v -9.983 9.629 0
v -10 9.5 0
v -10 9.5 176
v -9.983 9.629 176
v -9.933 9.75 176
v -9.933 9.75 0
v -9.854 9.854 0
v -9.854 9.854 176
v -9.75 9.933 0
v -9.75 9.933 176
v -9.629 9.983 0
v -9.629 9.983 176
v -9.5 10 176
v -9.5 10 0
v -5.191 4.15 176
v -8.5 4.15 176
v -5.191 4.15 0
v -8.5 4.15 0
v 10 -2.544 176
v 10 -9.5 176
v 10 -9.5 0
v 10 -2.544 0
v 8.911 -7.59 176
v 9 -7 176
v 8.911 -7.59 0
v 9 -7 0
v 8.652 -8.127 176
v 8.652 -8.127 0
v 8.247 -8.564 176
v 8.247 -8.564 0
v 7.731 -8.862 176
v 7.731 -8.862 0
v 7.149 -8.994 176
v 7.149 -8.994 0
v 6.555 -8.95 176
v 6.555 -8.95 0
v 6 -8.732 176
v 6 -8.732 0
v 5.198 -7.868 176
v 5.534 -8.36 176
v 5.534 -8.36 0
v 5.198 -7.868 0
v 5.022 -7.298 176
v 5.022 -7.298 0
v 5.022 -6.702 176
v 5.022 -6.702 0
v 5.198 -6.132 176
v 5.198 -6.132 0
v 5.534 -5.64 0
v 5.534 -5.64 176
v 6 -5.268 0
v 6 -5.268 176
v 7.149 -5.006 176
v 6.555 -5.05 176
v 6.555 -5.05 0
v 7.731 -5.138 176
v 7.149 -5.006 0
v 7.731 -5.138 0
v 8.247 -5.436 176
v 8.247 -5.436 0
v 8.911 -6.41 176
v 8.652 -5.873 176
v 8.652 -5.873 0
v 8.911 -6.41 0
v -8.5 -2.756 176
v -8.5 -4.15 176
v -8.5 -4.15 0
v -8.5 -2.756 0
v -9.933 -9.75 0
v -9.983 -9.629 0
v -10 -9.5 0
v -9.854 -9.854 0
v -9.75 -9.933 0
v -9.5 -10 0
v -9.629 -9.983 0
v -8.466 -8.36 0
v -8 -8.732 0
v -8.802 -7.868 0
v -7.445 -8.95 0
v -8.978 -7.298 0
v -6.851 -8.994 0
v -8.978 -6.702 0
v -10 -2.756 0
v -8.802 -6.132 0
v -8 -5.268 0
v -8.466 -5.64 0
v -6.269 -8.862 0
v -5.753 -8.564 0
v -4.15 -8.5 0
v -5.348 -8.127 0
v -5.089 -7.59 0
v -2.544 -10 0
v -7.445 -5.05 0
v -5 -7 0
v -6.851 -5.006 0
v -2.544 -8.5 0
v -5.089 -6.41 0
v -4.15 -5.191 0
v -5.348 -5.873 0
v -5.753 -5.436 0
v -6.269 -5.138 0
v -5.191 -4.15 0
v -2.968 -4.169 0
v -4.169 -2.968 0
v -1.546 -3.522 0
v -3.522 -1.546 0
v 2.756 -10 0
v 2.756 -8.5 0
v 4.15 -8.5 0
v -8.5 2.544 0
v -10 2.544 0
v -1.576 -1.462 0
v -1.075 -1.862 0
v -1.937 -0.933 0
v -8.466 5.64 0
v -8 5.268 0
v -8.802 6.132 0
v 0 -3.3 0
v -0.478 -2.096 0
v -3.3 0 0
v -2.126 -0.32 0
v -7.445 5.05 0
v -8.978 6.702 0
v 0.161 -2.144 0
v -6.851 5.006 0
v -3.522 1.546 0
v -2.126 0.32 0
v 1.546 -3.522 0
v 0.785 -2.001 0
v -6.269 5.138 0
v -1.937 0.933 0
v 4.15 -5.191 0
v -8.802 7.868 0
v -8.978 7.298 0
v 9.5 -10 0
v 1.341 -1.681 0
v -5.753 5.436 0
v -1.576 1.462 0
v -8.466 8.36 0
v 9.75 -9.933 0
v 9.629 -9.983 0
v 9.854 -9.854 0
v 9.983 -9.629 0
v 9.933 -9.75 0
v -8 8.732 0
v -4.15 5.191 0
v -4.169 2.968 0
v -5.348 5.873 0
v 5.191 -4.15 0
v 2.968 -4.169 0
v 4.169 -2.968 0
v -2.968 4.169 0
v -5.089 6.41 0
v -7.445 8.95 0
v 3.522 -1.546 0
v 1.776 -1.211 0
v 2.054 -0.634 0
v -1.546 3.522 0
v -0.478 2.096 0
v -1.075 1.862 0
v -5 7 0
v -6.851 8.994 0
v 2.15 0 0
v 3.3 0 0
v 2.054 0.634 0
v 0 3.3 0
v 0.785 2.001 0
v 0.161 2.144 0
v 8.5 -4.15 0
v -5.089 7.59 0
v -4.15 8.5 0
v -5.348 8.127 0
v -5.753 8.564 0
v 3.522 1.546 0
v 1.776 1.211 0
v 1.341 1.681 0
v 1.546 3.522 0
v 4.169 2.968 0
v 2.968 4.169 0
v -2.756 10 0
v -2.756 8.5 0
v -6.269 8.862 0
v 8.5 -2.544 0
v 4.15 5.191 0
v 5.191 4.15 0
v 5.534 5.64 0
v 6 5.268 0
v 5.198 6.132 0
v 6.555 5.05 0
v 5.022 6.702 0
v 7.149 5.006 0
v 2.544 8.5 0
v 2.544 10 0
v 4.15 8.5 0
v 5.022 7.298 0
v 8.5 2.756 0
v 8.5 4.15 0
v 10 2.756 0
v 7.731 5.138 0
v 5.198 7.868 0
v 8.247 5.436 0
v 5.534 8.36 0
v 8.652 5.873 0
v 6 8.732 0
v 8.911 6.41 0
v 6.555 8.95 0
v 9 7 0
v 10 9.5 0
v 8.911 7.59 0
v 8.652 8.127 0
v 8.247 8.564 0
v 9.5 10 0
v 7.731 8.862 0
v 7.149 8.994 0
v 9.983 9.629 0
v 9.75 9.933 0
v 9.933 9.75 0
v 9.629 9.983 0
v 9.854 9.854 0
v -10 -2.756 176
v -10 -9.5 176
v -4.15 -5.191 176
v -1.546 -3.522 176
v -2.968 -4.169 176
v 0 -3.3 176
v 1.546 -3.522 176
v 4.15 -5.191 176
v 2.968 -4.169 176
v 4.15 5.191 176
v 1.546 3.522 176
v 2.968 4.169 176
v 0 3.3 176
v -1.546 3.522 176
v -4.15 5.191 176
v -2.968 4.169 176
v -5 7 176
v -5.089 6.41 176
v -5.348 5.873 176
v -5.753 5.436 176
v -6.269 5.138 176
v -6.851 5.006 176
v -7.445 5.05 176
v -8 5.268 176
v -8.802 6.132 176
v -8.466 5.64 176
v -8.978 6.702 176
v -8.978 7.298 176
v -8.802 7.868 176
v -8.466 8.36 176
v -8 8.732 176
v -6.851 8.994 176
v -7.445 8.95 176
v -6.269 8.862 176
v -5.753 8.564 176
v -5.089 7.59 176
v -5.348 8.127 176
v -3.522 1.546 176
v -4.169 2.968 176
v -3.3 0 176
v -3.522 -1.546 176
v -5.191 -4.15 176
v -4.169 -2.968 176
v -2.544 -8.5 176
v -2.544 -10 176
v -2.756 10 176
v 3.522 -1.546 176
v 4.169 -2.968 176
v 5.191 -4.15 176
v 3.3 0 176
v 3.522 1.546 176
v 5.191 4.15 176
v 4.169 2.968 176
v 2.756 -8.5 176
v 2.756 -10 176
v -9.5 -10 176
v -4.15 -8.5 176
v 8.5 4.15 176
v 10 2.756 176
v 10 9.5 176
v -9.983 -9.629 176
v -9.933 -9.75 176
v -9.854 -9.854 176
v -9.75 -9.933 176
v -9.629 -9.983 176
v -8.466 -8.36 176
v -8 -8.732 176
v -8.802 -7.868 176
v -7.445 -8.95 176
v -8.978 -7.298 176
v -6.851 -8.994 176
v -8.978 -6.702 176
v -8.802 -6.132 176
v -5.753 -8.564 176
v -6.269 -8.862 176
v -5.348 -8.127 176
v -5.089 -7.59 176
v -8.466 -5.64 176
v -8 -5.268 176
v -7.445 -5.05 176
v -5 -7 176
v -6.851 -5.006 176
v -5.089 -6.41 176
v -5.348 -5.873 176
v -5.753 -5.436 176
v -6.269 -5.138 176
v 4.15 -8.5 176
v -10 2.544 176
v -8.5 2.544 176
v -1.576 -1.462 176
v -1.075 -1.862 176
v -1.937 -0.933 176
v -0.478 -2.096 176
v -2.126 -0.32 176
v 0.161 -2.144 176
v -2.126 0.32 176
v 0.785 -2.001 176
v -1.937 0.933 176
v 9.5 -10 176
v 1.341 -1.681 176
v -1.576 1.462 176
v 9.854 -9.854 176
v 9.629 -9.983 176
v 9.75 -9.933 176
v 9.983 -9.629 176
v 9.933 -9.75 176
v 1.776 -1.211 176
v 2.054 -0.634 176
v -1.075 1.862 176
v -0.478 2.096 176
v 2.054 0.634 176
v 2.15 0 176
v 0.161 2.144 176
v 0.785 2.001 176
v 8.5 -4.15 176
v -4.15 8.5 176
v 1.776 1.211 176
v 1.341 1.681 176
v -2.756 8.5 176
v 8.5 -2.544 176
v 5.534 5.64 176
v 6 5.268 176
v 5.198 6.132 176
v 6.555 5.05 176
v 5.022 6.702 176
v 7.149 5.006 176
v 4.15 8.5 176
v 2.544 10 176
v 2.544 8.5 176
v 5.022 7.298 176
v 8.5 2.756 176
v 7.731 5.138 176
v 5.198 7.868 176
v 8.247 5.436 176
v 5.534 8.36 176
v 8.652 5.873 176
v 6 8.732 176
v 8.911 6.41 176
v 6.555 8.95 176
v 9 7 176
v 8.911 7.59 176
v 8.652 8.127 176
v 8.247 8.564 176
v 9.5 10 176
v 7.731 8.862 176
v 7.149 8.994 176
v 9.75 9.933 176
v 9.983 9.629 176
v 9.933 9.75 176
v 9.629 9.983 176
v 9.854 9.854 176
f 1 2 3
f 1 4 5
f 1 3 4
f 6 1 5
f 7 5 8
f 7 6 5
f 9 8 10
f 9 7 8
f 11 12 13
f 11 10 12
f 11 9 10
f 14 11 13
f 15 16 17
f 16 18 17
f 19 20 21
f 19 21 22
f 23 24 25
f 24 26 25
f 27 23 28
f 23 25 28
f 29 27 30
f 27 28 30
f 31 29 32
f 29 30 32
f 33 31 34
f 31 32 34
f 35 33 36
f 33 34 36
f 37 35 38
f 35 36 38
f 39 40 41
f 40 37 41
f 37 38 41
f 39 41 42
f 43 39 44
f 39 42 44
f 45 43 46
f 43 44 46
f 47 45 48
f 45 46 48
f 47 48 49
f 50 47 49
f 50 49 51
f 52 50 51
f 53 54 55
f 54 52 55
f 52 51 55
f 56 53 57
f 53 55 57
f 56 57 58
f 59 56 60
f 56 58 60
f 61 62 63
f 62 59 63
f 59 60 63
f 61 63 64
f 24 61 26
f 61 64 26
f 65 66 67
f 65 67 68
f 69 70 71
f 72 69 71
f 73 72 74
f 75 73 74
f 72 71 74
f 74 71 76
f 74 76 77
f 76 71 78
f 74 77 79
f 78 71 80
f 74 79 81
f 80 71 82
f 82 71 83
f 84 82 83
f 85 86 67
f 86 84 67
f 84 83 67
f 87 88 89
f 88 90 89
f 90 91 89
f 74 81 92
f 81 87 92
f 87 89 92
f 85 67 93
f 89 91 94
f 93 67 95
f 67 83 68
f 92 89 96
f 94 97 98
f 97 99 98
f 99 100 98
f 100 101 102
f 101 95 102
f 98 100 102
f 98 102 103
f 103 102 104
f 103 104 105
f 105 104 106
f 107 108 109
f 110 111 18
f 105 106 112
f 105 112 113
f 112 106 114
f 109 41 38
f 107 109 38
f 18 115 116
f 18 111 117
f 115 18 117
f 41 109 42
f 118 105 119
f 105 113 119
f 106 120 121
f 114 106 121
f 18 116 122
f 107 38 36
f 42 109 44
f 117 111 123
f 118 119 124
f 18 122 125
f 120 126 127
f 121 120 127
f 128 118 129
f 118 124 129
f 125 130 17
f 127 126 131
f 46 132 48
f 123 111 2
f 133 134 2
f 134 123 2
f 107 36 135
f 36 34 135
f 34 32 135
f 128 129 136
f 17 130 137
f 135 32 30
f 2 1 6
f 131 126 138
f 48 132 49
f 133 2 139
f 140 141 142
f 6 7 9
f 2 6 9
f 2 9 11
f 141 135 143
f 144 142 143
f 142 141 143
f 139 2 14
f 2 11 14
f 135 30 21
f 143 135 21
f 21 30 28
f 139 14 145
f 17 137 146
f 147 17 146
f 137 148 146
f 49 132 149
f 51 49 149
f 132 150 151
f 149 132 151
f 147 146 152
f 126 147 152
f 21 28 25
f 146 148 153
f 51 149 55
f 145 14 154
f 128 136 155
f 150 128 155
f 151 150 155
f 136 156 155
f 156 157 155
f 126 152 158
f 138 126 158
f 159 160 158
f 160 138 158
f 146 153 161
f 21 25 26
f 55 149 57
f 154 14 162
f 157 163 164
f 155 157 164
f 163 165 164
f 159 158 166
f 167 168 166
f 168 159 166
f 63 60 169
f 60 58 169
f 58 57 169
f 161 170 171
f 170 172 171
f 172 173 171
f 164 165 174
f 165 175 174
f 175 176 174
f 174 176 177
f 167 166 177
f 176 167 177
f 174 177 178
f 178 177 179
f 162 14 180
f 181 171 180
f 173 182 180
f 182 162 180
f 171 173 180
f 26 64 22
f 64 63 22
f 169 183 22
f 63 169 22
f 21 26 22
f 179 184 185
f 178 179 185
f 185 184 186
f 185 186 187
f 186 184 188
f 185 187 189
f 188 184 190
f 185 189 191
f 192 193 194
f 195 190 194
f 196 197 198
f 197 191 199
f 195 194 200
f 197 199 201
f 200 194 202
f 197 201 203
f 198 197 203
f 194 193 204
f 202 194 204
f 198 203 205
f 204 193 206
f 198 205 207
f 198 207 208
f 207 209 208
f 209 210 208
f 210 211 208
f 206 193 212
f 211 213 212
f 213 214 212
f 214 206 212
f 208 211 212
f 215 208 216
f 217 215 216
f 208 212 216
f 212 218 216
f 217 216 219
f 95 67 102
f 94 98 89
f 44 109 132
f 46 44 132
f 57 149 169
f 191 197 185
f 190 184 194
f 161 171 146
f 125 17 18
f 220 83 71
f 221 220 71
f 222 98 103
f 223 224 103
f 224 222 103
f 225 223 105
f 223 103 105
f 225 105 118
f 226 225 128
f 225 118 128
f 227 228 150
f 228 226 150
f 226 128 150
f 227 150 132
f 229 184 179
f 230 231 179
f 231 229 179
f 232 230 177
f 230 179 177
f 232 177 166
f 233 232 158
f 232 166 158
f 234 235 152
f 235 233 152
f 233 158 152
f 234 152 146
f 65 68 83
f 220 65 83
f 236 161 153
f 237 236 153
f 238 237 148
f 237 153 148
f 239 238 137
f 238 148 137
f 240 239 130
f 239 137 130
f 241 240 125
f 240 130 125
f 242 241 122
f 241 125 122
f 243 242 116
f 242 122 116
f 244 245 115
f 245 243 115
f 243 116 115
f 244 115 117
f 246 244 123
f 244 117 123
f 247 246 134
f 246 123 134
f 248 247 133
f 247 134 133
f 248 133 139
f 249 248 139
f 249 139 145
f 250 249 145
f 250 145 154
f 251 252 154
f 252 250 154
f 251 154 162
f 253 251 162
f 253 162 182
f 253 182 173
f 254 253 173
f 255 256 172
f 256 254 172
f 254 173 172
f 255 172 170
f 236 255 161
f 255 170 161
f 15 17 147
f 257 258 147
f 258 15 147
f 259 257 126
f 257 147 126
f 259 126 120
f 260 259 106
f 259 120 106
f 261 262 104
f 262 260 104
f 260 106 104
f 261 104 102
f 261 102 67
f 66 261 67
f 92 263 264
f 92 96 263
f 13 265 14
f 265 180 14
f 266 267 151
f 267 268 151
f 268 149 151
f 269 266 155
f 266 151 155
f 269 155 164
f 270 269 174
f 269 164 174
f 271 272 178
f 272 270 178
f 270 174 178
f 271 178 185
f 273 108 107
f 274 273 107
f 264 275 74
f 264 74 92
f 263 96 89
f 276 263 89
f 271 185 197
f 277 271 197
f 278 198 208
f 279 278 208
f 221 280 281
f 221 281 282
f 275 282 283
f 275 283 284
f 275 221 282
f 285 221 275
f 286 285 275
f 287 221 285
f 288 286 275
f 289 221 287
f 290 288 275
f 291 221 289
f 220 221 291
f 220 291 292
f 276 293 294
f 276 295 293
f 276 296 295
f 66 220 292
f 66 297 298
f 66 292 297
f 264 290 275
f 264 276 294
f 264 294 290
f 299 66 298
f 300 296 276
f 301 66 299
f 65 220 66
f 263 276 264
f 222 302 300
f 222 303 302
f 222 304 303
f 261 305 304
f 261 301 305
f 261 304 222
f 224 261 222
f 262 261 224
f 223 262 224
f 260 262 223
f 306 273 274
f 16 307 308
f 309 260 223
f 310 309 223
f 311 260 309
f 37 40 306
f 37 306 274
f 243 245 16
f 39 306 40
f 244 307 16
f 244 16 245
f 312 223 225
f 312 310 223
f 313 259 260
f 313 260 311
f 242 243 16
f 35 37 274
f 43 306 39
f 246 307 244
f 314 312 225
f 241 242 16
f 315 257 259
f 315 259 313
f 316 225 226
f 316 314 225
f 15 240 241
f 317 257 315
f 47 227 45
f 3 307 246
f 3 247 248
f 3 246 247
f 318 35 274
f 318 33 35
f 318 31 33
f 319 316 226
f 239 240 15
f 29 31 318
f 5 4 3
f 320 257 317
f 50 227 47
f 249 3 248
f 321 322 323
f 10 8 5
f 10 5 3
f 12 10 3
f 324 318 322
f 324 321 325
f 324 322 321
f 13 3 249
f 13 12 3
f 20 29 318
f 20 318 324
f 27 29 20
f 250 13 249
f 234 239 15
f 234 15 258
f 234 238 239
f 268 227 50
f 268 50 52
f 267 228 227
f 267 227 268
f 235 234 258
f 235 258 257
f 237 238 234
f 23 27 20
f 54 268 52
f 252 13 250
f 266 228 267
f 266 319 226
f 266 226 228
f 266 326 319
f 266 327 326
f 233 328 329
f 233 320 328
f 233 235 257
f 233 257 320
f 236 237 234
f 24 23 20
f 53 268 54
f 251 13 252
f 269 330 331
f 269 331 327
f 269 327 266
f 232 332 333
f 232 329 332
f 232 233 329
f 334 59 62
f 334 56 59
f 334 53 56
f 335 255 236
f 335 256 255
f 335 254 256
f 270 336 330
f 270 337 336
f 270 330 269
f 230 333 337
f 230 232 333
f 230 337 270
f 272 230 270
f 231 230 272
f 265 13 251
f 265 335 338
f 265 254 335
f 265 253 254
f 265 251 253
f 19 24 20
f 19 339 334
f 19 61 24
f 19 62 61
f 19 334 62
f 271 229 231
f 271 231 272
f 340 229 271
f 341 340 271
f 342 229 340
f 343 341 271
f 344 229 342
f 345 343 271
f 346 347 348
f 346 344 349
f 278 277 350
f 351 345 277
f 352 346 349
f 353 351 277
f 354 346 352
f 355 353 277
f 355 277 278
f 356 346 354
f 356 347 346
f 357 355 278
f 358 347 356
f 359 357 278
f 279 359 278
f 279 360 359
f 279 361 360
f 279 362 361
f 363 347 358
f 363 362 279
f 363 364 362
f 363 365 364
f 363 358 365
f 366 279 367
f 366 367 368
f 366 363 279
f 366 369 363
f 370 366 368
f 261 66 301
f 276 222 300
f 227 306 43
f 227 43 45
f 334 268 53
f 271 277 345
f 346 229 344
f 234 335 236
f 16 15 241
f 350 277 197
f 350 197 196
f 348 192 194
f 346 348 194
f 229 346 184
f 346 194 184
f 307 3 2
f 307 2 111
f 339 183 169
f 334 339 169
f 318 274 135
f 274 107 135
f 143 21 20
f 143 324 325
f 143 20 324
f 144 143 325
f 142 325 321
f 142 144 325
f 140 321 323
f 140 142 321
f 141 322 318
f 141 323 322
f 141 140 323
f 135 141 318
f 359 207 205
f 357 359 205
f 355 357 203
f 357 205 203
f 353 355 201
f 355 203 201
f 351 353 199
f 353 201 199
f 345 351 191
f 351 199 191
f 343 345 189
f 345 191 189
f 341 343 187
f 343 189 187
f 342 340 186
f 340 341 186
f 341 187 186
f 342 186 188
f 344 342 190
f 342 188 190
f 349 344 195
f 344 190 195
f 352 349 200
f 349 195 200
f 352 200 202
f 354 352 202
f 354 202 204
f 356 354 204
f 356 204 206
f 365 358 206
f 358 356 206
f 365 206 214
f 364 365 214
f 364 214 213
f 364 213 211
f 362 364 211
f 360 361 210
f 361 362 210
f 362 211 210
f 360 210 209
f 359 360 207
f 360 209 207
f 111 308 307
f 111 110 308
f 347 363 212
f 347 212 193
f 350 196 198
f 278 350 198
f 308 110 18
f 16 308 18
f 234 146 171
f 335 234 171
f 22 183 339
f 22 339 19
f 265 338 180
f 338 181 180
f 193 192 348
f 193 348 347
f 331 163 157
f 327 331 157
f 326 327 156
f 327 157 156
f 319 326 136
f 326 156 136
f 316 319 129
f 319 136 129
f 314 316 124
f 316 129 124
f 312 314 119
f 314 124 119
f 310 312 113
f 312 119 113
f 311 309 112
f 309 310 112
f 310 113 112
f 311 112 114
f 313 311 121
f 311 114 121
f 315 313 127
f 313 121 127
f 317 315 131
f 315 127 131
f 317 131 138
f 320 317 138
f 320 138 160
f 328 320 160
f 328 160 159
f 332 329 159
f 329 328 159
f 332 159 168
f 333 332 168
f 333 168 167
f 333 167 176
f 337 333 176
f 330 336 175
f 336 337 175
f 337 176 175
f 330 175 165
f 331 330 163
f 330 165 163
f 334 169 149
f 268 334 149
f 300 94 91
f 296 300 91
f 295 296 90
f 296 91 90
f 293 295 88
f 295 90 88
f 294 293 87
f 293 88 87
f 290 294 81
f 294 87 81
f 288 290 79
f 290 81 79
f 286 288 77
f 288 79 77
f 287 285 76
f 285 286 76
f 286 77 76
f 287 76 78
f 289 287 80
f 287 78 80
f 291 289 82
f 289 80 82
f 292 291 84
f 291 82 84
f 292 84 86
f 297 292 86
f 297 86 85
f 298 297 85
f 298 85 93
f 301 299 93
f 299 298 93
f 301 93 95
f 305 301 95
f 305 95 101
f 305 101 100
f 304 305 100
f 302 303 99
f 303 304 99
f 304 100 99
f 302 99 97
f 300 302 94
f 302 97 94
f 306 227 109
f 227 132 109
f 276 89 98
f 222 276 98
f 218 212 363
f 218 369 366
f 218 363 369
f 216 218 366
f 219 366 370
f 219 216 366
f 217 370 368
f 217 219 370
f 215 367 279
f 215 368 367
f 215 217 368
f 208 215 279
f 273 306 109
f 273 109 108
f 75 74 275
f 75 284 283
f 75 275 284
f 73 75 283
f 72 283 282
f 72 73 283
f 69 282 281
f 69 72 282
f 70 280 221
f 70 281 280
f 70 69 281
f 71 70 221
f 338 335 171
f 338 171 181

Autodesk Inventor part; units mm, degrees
ref_plane "YZ Plane" through (0, 0, 0) normal (1, 0, 0) x (0, 1, 0)
ref_plane "XZ Plane" through (0, 0, 0) normal (0, 1, 0) x (-1, 0, 0)
ref_plane "XY Plane" through (0, 0, 0) normal (0, 0, 1) x (1, 0, 0)
sketch "Sketch1" plane through (0, 0, 0) normal (0, 0, 1) x (1, 0, 0)
  line L0 (-10, -10) -> (10, 10) construction
  line L1 (10, -10) -> (-10, 10) construction
  arc A0 (-10, -9.5) -> (-9.5, -10) centre (-9.5, -9.5) ccw
  arc A1 (-9.5, 10) -> (-10, 9.5) centre (-9.5, 9.5) ccw
  arc A2 (10, 9.5) -> (9.5, 10) centre (9.5, 9.5) ccw
  arc A3 (9.5, -10) -> (10, -9.5) centre (9.5, -9.5) ccw
  line L2 (7, -7) -> (-7, -7) construction
  line L3 (-7, -7) -> (-7, 7) construction
  line L4 (-7, 7) -> (7, 7) construction
  line L5 (7, 7) -> (7, -7) construction
  line L6 (7, -7) -> (-7, 7) construction
  line L7 (-7, -7) -> (7, 7) construction
  circle A4 centre (-7, -7) radius 2
  circle A5 centre (-7, 7) radius 2
  circle A6 centre (7, 7) radius 2
  circle A7 centre (7, -7) radius 2
  circle A8 centre (0, 0) radius 2.15
  line L8 (-8.5, 4.15) -> (-5.1906, 4.15)
  arc A9 (-5.1906, -4.15) -> (-5.1906, 4.15) centre (-8.8, 0) ccw
  line L9 (-5.1906, -4.15) -> (-8.5, -4.15)
  line L10 (-8.5, -4.15) -> (-8.5, -2.7559)
  line L11 (-8.5, 2.5441) -> (-8.5, 4.15)
  line L12 (-5.1906, -4.15) -> (-5.1906, 4.15) construction
  line L13 (-8.5, -2.7559) -> (-10, -2.7559)
  line L14 (-8.5, 2.5441) -> (-10, 2.5441)
  line L15 (-10, 9.5) -> (-10, 2.5441)
  line L16 (-10, -2.7559) -> (-10, -9.5)
  line L17 (4.15, -8.5) -> (2.7559, -8.5)
  line L18 (2.7559, -8.5) -> (2.7559, -10)
  line L19 (4.15, -5.1906) -> (-4.15, -5.1906) construction
  arc A10 (4.15, -5.1906) -> (-4.15, -5.1906) centre (0, -8.8) ccw
  line L20 (7, -7) -> (-7, 7) construction
  line L21 (10, -10) -> (-10, 10) construction
  line L22 (-4.15, -8.5) -> (-4.15, -5.1906)
  line L23 (4.15, -5.1906) -> (4.15, -8.5)
  line L24 (-2.5441, -8.5) -> (-2.5441, -10)
  line L25 (-2.5441, -8.5) -> (-4.15, -8.5)
  line L26 (8.5, 4.15) -> (8.5, 2.7559)
  line L27 (8.5, 2.7559) -> (10, 2.7559)
  line L28 (5.1906, 4.15) -> (5.1906, -4.15) construction
  arc A11 (5.1906, 4.15) -> (5.1906, -4.15) centre (8.8, 0) ccw
  line L29 (7, 7) -> (-7, -7) construction
  line L30 (10, 10) -> (-10, -10) construction
  line L31 (8.5, -4.15) -> (5.1906, -4.15)
  line L32 (5.1906, 4.15) -> (8.5, 4.15)
  line L33 (8.5, -2.5441) -> (10, -2.5441)
  line L34 (8.5, -2.5441) -> (8.5, -4.15)
  line L35 (-4.15, 8.5) -> (-2.7559, 8.5)
  line L36 (-2.7559, 8.5) -> (-2.7559, 10)
  line L37 (-4.15, 5.1906) -> (4.15, 5.1906) construction
  arc A12 (-4.15, 5.1906) -> (4.15, 5.1906) centre (0, 8.8) ccw
  line L38 (-7, 7) -> (7, -7) construction
  line L39 (-10, 10) -> (10, -10) construction
  line L40 (4.15, 8.5) -> (4.15, 5.1906)
  line L41 (-4.15, 5.1906) -> (-4.15, 8.5)
  line L42 (2.5441, 8.5) -> (2.5441, 10)
  line L43 (2.5441, 8.5) -> (4.15, 8.5)
  line L44 (-9.5, -10) -> (-2.5441, -10)
  line L45 (2.7559, -10) -> (9.5, -10)
  line L46 (9.5, 10) -> (2.5441, 10)
  line L47 (-2.7559, 10) -> (-9.5, 10)
  line L48 (10, -9.5) -> (10, -2.5441)
  line L49 (10, 2.7559) -> (10, 9.5)
  line L50 (2292.4151, 1187.1915) -> (2314.8128, 1187.1915)
  circle A13 centre (2303.6139, 1187.1915) radius 2.15
  line L51 (2307.7639, 1192.1343) -> (2307.7639, 1195.3915)
  arc A14 (2307.7639, 1195.3915) -> (2307.4639, 1195.6915) centre (2307.4639, 1195.3915) ccw
  line L52 (2307.4639, 1195.6915) -> (2306.5639, 1195.6915)
  arc A15 (2306.2639, 1195.9915) -> (2306.5639, 1195.6915) centre (2306.5639, 1195.9915) ccw
  line L53 (2306.2639, 1195.9915) -> (2306.2639, 1196.8915)
  arc A16 (2306.5639, 1197.1915) -> (2306.2639, 1196.8915) centre (2306.5639, 1196.8915) ccw
  line L54 (2306.5639, 1197.1915) -> (2313.3139, 1197.1915)
  arc A17 (2313.6139, 1196.8915) -> (2313.3139, 1197.1915) centre (2313.3139, 1196.8915) ccw
  line L55 (2313.6139, 1196.8915) -> (2313.6139, 1190.1415)
  arc A18 (2313.3139, 1189.8415) -> (2313.6139, 1190.1415) centre (2313.3139, 1190.1415) ccw
  line L56 (2313.3139, 1189.8415) -> (2312.4139, 1189.8415)
  arc A19 (2312.1139, 1190.1415) -> (2312.4139, 1189.8415) centre (2312.4139, 1190.1415) ccw
  line L57 (2312.1139, 1190.1415) -> (2312.1139, 1191.0415)
  arc A20 (2312.1139, 1191.0415) -> (2311.8139, 1191.3415) centre (2311.8139, 1191.0415) ccw
  line L58 (2311.8139, 1191.3415) -> (2308.5567, 1191.3415)
  arc A21 (2308.5567, 1191.3415) -> (2308.3217, 1191.2281) centre (2308.5567, 1191.0415) ccw
  arc A22 (2308.3217, 1191.2281) -> (2306.9212, 1187.4988) centre (2313.4048, 1187.1915) ccw
  line L59 (2306.9212, 1187.4988) -> (2306.6139, 1187.1915)
  line L60 (2306.6139, 1187.1915) -> (2306.9212, 1186.8843)
  arc A23 (2306.9212, 1186.8843) -> (2308.3217, 1183.155) centre (2313.4048, 1187.1915) ccw
  arc A24 (2308.3217, 1183.155) -> (2308.5567, 1183.0415) centre (2308.5567, 1183.3415) ccw
  line L61 (2308.5567, 1183.0415) -> (2311.8139, 1183.0415)
  arc A25 (2311.8139, 1183.0415) -> (2312.1139, 1183.3415) centre (2311.8139, 1183.3415) ccw
  line L62 (2312.1139, 1183.3415) -> (2312.1139, 1184.2415)
  arc A26 (2312.4139, 1184.5415) -> (2312.1139, 1184.2415) centre (2312.4139, 1184.2415) ccw
  line L63 (2312.4139, 1184.5415) -> (2313.3139, 1184.5415)
  arc A27 (2313.6139, 1184.2415) -> (2313.3139, 1184.5415) centre (2313.3139, 1184.2415) ccw
  line L64 (2313.6139, 1184.2415) -> (2313.6139, 1177.4915)
  arc A28 (2313.3139, 1177.1915) -> (2313.6139, 1177.4915) centre (2313.3139, 1177.4915) ccw
  line L65 (2313.3139, 1177.1915) -> (2306.5639, 1177.1915)
  arc A29 (2306.2639, 1177.4915) -> (2306.5639, 1177.1915) centre (2306.5639, 1177.4915) ccw
  line L66 (2306.2639, 1177.4915) -> (2306.2639, 1178.3915)
  arc A30 (2306.5639, 1178.6915) -> (2306.2639, 1178.3915) centre (2306.5639, 1178.3915) ccw
  line L67 (2306.5639, 1178.6915) -> (2307.4639, 1178.6915)
  arc A31 (2307.4639, 1178.6915) -> (2307.7639, 1178.9915) centre (2307.4639, 1178.9915) ccw
  line L68 (2307.7639, 1178.9915) -> (2307.7639, 1182.2488)
  arc A32 (2307.7639, 1182.2488) -> (2307.6505, 1182.4837) centre (2307.4639, 1182.2488) ccw
  arc A33 (2307.6505, 1182.4837) -> (2303.9212, 1183.8843) centre (2303.6139, 1177.4007) ccw
  line L69 (2303.9212, 1183.8843) -> (2303.6139, 1184.1915)
  line L70 (2303.6139, 1184.1915) -> (2303.3066, 1183.8843)
  arc A34 (2303.3066, 1183.8843) -> (2299.5774, 1182.4837) centre (2303.6139, 1177.4007) ccw
  arc A35 (2299.5774, 1182.4837) -> (2299.4639, 1182.2488) centre (2299.7639, 1182.2488) ccw
  line L71 (2299.4639, 1182.2488) -> (2299.4639, 1178.9915)
  arc A36 (2299.4639, 1178.9915) -> (2299.7639, 1178.6915) centre (2299.7639, 1178.9915) ccw
  line L72 (2299.7639, 1178.6915) -> (2300.6639, 1178.6915)
  arc A37 (2300.9639, 1178.3915) -> (2300.6639, 1178.6915) centre (2300.6639, 1178.3915) ccw
  line L73 (2300.9639, 1178.3915) -> (2300.9639, 1177.4915)
  arc A38 (2300.6639, 1177.1915) -> (2300.9639, 1177.4915) centre (2300.6639, 1177.4915) ccw
  line L74 (2300.6639, 1177.1915) -> (2293.9139, 1177.1915)
  arc A39 (2293.6139, 1177.4915) -> (2293.9139, 1177.1915) centre (2293.9139, 1177.4915) ccw
  line L75 (2293.6139, 1177.4915) -> (2293.6139, 1184.2415)
  arc A40 (2293.9139, 1184.5415) -> (2293.6139, 1184.2415) centre (2293.9139, 1184.2415) ccw
  line L76 (2293.9139, 1184.5415) -> (2294.8139, 1184.5415)
  arc A41 (2295.1139, 1184.2415) -> (2294.8139, 1184.5415) centre (2294.8139, 1184.2415) ccw
  line L77 (2295.1139, 1184.2415) -> (2295.1139, 1183.3415)
  arc A42 (2295.1139, 1183.3415) -> (2295.4139, 1183.0415) centre (2295.4139, 1183.3415) ccw
  line L78 (2295.4139, 1183.0415) -> (2298.6712, 1183.0415)
  arc A43 (2298.6712, 1183.0415) -> (2298.9061, 1183.155) centre (2298.6712, 1183.3415) ccw
  arc A44 (2298.9061, 1183.155) -> (2300.3066, 1186.8843) centre (2293.8231, 1187.1915) ccw
  line L79 (2300.3066, 1186.8843) -> (2300.6139, 1187.1915)
  line L80 (2300.6139, 1187.1915) -> (2300.3066, 1187.4988)
  arc A45 (2300.3066, 1187.4988) -> (2298.9061, 1191.2281) centre (2293.8231, 1187.1915) ccw
  arc A46 (2298.9061, 1191.2281) -> (2298.6712, 1191.3415) centre (2298.6712, 1191.0415) ccw
  line L81 (2298.6712, 1191.3415) -> (2295.4139, 1191.3415)
  arc A47 (2295.4139, 1191.3415) -> (2295.1139, 1191.0415) centre (2295.4139, 1191.0415) ccw
  line L82 (2295.1139, 1191.0415) -> (2295.1139, 1190.1415)
  arc A48 (2294.8139, 1189.8415) -> (2295.1139, 1190.1415) centre (2294.8139, 1190.1415) ccw
  line L83 (2294.8139, 1189.8415) -> (2293.9139, 1189.8415)
  arc A49 (2293.6139, 1190.1415) -> (2293.9139, 1189.8415) centre (2293.9139, 1190.1415) ccw
  line L84 (2293.6139, 1190.1415) -> (2293.6139, 1196.8915)
  arc A50 (2293.9139, 1197.1915) -> (2293.6139, 1196.8915) centre (2293.9139, 1196.8915) ccw
  line L85 (2293.9139, 1197.1915) -> (2300.6639, 1197.1915)
  arc A51 (2300.9639, 1196.8915) -> (2300.6639, 1197.1915) centre (2300.6639, 1196.8915) ccw
  line L86 (2300.9639, 1196.8915) -> (2300.9639, 1195.9915)
  arc A52 (2300.6639, 1195.6915) -> (2300.9639, 1195.9915) centre (2300.6639, 1195.9915) ccw
  line L87 (2300.6639, 1195.6915) -> (2299.7639, 1195.6915)
  arc A53 (2299.7639, 1195.6915) -> (2299.4639, 1195.3915) centre (2299.7639, 1195.3915) ccw
  line L88 (2299.4639, 1195.3915) -> (2299.4639, 1192.1343)
  arc A54 (2299.4639, 1192.1343) -> (2299.5774, 1191.8994) centre (2299.7639, 1192.1343) ccw
  arc A55 (2299.5774, 1191.8994) -> (2303.3066, 1190.4988) centre (2303.6139, 1196.9824) ccw
  line L89 (2303.3066, 1190.4988) -> (2303.6139, 1190.1915)
  line L90 (2303.6139, 1190.1915) -> (2303.9212, 1190.4988)
  arc A56 (2303.9212, 1190.4988) -> (2307.6505, 1191.8994) centre (2303.6139, 1196.9824) ccw
  arc A57 (2307.6505, 1191.8994) -> (2307.7639, 1192.1343) centre (2307.4639, 1192.1343) ccw
  line L91 (2294.1139, 1194.1915) -> (2299.1139, 1194.1915)
  line L92 (2296.6139, 1196.6915) -> (2296.6139, 1191.6915)
  circle A58 centre (2296.6139, 1194.1915) radius 2
  line L93 (2294.1139, 1180.1915) -> (2299.1139, 1180.1915)
  line L94 (2296.6139, 1177.6915) -> (2296.6139, 1182.6915)
  circle A59 centre (2296.6139, 1180.1915) radius 2
  line L95 (2303.6139, 1198.3904) -> (2303.6139, 1175.9927)
  line L96 (2313.1139, 1194.1915) -> (2308.1139, 1194.1915)
  line L97 (2310.6139, 1196.6915) -> (2310.6139, 1191.6915)
  circle A60 centre (2310.6139, 1194.1915) radius 2
  circle A61 centre (2310.6139, 1180.1915) radius 2
  line L98 (2310.6139, 1177.6915) -> (2310.6139, 1182.6915)
  line L99 (2313.1139, 1180.1915) -> (2308.1139, 1180.1915)
  point P0 (-10, 0)
  point P1 (-5.8595, 0)
  point P2 (-5.1906, 0)
  point P3 (-10, 0)
  point P4 (0, -5.8595)
  point P5 (0, -5.1906)
  point P6 (5.8595, 0)
  point P7 (5.1906, 0)
  point P8 (0, 5.8595)
  point P9 (0, 5.1906)
  dimension "d0" = 20
  dimension "d1" = 20
  dimension "d2" = 0.5
  dimension "d3" = 14
  dimension "d4" = 14
  dimension "d5" = 4
  dimension "d6" = 4.3
  dimension "d13" = 5.5
  dimension "d14" = 8.3
  dimension "d16" = 5.3
  dimension "d17" = 6.7
  dimension "d18" = 1.5
  dimension "d21" = 360
extrude "Extrusion1" add sketch "Sketch1" along normal blind 176 contours L16 L13 L10 L9 A9 L8 L11 L14 L15 A1 L47 L36 L35 L41 A12 L40 L43 L42 L46 A2 L49 L27 L26 L32 A11 L31 L34 L33 L48 A3 L45 L18 L17 L23 A10 L22 L25 L24 L44 A0
properties part number "Profile"
